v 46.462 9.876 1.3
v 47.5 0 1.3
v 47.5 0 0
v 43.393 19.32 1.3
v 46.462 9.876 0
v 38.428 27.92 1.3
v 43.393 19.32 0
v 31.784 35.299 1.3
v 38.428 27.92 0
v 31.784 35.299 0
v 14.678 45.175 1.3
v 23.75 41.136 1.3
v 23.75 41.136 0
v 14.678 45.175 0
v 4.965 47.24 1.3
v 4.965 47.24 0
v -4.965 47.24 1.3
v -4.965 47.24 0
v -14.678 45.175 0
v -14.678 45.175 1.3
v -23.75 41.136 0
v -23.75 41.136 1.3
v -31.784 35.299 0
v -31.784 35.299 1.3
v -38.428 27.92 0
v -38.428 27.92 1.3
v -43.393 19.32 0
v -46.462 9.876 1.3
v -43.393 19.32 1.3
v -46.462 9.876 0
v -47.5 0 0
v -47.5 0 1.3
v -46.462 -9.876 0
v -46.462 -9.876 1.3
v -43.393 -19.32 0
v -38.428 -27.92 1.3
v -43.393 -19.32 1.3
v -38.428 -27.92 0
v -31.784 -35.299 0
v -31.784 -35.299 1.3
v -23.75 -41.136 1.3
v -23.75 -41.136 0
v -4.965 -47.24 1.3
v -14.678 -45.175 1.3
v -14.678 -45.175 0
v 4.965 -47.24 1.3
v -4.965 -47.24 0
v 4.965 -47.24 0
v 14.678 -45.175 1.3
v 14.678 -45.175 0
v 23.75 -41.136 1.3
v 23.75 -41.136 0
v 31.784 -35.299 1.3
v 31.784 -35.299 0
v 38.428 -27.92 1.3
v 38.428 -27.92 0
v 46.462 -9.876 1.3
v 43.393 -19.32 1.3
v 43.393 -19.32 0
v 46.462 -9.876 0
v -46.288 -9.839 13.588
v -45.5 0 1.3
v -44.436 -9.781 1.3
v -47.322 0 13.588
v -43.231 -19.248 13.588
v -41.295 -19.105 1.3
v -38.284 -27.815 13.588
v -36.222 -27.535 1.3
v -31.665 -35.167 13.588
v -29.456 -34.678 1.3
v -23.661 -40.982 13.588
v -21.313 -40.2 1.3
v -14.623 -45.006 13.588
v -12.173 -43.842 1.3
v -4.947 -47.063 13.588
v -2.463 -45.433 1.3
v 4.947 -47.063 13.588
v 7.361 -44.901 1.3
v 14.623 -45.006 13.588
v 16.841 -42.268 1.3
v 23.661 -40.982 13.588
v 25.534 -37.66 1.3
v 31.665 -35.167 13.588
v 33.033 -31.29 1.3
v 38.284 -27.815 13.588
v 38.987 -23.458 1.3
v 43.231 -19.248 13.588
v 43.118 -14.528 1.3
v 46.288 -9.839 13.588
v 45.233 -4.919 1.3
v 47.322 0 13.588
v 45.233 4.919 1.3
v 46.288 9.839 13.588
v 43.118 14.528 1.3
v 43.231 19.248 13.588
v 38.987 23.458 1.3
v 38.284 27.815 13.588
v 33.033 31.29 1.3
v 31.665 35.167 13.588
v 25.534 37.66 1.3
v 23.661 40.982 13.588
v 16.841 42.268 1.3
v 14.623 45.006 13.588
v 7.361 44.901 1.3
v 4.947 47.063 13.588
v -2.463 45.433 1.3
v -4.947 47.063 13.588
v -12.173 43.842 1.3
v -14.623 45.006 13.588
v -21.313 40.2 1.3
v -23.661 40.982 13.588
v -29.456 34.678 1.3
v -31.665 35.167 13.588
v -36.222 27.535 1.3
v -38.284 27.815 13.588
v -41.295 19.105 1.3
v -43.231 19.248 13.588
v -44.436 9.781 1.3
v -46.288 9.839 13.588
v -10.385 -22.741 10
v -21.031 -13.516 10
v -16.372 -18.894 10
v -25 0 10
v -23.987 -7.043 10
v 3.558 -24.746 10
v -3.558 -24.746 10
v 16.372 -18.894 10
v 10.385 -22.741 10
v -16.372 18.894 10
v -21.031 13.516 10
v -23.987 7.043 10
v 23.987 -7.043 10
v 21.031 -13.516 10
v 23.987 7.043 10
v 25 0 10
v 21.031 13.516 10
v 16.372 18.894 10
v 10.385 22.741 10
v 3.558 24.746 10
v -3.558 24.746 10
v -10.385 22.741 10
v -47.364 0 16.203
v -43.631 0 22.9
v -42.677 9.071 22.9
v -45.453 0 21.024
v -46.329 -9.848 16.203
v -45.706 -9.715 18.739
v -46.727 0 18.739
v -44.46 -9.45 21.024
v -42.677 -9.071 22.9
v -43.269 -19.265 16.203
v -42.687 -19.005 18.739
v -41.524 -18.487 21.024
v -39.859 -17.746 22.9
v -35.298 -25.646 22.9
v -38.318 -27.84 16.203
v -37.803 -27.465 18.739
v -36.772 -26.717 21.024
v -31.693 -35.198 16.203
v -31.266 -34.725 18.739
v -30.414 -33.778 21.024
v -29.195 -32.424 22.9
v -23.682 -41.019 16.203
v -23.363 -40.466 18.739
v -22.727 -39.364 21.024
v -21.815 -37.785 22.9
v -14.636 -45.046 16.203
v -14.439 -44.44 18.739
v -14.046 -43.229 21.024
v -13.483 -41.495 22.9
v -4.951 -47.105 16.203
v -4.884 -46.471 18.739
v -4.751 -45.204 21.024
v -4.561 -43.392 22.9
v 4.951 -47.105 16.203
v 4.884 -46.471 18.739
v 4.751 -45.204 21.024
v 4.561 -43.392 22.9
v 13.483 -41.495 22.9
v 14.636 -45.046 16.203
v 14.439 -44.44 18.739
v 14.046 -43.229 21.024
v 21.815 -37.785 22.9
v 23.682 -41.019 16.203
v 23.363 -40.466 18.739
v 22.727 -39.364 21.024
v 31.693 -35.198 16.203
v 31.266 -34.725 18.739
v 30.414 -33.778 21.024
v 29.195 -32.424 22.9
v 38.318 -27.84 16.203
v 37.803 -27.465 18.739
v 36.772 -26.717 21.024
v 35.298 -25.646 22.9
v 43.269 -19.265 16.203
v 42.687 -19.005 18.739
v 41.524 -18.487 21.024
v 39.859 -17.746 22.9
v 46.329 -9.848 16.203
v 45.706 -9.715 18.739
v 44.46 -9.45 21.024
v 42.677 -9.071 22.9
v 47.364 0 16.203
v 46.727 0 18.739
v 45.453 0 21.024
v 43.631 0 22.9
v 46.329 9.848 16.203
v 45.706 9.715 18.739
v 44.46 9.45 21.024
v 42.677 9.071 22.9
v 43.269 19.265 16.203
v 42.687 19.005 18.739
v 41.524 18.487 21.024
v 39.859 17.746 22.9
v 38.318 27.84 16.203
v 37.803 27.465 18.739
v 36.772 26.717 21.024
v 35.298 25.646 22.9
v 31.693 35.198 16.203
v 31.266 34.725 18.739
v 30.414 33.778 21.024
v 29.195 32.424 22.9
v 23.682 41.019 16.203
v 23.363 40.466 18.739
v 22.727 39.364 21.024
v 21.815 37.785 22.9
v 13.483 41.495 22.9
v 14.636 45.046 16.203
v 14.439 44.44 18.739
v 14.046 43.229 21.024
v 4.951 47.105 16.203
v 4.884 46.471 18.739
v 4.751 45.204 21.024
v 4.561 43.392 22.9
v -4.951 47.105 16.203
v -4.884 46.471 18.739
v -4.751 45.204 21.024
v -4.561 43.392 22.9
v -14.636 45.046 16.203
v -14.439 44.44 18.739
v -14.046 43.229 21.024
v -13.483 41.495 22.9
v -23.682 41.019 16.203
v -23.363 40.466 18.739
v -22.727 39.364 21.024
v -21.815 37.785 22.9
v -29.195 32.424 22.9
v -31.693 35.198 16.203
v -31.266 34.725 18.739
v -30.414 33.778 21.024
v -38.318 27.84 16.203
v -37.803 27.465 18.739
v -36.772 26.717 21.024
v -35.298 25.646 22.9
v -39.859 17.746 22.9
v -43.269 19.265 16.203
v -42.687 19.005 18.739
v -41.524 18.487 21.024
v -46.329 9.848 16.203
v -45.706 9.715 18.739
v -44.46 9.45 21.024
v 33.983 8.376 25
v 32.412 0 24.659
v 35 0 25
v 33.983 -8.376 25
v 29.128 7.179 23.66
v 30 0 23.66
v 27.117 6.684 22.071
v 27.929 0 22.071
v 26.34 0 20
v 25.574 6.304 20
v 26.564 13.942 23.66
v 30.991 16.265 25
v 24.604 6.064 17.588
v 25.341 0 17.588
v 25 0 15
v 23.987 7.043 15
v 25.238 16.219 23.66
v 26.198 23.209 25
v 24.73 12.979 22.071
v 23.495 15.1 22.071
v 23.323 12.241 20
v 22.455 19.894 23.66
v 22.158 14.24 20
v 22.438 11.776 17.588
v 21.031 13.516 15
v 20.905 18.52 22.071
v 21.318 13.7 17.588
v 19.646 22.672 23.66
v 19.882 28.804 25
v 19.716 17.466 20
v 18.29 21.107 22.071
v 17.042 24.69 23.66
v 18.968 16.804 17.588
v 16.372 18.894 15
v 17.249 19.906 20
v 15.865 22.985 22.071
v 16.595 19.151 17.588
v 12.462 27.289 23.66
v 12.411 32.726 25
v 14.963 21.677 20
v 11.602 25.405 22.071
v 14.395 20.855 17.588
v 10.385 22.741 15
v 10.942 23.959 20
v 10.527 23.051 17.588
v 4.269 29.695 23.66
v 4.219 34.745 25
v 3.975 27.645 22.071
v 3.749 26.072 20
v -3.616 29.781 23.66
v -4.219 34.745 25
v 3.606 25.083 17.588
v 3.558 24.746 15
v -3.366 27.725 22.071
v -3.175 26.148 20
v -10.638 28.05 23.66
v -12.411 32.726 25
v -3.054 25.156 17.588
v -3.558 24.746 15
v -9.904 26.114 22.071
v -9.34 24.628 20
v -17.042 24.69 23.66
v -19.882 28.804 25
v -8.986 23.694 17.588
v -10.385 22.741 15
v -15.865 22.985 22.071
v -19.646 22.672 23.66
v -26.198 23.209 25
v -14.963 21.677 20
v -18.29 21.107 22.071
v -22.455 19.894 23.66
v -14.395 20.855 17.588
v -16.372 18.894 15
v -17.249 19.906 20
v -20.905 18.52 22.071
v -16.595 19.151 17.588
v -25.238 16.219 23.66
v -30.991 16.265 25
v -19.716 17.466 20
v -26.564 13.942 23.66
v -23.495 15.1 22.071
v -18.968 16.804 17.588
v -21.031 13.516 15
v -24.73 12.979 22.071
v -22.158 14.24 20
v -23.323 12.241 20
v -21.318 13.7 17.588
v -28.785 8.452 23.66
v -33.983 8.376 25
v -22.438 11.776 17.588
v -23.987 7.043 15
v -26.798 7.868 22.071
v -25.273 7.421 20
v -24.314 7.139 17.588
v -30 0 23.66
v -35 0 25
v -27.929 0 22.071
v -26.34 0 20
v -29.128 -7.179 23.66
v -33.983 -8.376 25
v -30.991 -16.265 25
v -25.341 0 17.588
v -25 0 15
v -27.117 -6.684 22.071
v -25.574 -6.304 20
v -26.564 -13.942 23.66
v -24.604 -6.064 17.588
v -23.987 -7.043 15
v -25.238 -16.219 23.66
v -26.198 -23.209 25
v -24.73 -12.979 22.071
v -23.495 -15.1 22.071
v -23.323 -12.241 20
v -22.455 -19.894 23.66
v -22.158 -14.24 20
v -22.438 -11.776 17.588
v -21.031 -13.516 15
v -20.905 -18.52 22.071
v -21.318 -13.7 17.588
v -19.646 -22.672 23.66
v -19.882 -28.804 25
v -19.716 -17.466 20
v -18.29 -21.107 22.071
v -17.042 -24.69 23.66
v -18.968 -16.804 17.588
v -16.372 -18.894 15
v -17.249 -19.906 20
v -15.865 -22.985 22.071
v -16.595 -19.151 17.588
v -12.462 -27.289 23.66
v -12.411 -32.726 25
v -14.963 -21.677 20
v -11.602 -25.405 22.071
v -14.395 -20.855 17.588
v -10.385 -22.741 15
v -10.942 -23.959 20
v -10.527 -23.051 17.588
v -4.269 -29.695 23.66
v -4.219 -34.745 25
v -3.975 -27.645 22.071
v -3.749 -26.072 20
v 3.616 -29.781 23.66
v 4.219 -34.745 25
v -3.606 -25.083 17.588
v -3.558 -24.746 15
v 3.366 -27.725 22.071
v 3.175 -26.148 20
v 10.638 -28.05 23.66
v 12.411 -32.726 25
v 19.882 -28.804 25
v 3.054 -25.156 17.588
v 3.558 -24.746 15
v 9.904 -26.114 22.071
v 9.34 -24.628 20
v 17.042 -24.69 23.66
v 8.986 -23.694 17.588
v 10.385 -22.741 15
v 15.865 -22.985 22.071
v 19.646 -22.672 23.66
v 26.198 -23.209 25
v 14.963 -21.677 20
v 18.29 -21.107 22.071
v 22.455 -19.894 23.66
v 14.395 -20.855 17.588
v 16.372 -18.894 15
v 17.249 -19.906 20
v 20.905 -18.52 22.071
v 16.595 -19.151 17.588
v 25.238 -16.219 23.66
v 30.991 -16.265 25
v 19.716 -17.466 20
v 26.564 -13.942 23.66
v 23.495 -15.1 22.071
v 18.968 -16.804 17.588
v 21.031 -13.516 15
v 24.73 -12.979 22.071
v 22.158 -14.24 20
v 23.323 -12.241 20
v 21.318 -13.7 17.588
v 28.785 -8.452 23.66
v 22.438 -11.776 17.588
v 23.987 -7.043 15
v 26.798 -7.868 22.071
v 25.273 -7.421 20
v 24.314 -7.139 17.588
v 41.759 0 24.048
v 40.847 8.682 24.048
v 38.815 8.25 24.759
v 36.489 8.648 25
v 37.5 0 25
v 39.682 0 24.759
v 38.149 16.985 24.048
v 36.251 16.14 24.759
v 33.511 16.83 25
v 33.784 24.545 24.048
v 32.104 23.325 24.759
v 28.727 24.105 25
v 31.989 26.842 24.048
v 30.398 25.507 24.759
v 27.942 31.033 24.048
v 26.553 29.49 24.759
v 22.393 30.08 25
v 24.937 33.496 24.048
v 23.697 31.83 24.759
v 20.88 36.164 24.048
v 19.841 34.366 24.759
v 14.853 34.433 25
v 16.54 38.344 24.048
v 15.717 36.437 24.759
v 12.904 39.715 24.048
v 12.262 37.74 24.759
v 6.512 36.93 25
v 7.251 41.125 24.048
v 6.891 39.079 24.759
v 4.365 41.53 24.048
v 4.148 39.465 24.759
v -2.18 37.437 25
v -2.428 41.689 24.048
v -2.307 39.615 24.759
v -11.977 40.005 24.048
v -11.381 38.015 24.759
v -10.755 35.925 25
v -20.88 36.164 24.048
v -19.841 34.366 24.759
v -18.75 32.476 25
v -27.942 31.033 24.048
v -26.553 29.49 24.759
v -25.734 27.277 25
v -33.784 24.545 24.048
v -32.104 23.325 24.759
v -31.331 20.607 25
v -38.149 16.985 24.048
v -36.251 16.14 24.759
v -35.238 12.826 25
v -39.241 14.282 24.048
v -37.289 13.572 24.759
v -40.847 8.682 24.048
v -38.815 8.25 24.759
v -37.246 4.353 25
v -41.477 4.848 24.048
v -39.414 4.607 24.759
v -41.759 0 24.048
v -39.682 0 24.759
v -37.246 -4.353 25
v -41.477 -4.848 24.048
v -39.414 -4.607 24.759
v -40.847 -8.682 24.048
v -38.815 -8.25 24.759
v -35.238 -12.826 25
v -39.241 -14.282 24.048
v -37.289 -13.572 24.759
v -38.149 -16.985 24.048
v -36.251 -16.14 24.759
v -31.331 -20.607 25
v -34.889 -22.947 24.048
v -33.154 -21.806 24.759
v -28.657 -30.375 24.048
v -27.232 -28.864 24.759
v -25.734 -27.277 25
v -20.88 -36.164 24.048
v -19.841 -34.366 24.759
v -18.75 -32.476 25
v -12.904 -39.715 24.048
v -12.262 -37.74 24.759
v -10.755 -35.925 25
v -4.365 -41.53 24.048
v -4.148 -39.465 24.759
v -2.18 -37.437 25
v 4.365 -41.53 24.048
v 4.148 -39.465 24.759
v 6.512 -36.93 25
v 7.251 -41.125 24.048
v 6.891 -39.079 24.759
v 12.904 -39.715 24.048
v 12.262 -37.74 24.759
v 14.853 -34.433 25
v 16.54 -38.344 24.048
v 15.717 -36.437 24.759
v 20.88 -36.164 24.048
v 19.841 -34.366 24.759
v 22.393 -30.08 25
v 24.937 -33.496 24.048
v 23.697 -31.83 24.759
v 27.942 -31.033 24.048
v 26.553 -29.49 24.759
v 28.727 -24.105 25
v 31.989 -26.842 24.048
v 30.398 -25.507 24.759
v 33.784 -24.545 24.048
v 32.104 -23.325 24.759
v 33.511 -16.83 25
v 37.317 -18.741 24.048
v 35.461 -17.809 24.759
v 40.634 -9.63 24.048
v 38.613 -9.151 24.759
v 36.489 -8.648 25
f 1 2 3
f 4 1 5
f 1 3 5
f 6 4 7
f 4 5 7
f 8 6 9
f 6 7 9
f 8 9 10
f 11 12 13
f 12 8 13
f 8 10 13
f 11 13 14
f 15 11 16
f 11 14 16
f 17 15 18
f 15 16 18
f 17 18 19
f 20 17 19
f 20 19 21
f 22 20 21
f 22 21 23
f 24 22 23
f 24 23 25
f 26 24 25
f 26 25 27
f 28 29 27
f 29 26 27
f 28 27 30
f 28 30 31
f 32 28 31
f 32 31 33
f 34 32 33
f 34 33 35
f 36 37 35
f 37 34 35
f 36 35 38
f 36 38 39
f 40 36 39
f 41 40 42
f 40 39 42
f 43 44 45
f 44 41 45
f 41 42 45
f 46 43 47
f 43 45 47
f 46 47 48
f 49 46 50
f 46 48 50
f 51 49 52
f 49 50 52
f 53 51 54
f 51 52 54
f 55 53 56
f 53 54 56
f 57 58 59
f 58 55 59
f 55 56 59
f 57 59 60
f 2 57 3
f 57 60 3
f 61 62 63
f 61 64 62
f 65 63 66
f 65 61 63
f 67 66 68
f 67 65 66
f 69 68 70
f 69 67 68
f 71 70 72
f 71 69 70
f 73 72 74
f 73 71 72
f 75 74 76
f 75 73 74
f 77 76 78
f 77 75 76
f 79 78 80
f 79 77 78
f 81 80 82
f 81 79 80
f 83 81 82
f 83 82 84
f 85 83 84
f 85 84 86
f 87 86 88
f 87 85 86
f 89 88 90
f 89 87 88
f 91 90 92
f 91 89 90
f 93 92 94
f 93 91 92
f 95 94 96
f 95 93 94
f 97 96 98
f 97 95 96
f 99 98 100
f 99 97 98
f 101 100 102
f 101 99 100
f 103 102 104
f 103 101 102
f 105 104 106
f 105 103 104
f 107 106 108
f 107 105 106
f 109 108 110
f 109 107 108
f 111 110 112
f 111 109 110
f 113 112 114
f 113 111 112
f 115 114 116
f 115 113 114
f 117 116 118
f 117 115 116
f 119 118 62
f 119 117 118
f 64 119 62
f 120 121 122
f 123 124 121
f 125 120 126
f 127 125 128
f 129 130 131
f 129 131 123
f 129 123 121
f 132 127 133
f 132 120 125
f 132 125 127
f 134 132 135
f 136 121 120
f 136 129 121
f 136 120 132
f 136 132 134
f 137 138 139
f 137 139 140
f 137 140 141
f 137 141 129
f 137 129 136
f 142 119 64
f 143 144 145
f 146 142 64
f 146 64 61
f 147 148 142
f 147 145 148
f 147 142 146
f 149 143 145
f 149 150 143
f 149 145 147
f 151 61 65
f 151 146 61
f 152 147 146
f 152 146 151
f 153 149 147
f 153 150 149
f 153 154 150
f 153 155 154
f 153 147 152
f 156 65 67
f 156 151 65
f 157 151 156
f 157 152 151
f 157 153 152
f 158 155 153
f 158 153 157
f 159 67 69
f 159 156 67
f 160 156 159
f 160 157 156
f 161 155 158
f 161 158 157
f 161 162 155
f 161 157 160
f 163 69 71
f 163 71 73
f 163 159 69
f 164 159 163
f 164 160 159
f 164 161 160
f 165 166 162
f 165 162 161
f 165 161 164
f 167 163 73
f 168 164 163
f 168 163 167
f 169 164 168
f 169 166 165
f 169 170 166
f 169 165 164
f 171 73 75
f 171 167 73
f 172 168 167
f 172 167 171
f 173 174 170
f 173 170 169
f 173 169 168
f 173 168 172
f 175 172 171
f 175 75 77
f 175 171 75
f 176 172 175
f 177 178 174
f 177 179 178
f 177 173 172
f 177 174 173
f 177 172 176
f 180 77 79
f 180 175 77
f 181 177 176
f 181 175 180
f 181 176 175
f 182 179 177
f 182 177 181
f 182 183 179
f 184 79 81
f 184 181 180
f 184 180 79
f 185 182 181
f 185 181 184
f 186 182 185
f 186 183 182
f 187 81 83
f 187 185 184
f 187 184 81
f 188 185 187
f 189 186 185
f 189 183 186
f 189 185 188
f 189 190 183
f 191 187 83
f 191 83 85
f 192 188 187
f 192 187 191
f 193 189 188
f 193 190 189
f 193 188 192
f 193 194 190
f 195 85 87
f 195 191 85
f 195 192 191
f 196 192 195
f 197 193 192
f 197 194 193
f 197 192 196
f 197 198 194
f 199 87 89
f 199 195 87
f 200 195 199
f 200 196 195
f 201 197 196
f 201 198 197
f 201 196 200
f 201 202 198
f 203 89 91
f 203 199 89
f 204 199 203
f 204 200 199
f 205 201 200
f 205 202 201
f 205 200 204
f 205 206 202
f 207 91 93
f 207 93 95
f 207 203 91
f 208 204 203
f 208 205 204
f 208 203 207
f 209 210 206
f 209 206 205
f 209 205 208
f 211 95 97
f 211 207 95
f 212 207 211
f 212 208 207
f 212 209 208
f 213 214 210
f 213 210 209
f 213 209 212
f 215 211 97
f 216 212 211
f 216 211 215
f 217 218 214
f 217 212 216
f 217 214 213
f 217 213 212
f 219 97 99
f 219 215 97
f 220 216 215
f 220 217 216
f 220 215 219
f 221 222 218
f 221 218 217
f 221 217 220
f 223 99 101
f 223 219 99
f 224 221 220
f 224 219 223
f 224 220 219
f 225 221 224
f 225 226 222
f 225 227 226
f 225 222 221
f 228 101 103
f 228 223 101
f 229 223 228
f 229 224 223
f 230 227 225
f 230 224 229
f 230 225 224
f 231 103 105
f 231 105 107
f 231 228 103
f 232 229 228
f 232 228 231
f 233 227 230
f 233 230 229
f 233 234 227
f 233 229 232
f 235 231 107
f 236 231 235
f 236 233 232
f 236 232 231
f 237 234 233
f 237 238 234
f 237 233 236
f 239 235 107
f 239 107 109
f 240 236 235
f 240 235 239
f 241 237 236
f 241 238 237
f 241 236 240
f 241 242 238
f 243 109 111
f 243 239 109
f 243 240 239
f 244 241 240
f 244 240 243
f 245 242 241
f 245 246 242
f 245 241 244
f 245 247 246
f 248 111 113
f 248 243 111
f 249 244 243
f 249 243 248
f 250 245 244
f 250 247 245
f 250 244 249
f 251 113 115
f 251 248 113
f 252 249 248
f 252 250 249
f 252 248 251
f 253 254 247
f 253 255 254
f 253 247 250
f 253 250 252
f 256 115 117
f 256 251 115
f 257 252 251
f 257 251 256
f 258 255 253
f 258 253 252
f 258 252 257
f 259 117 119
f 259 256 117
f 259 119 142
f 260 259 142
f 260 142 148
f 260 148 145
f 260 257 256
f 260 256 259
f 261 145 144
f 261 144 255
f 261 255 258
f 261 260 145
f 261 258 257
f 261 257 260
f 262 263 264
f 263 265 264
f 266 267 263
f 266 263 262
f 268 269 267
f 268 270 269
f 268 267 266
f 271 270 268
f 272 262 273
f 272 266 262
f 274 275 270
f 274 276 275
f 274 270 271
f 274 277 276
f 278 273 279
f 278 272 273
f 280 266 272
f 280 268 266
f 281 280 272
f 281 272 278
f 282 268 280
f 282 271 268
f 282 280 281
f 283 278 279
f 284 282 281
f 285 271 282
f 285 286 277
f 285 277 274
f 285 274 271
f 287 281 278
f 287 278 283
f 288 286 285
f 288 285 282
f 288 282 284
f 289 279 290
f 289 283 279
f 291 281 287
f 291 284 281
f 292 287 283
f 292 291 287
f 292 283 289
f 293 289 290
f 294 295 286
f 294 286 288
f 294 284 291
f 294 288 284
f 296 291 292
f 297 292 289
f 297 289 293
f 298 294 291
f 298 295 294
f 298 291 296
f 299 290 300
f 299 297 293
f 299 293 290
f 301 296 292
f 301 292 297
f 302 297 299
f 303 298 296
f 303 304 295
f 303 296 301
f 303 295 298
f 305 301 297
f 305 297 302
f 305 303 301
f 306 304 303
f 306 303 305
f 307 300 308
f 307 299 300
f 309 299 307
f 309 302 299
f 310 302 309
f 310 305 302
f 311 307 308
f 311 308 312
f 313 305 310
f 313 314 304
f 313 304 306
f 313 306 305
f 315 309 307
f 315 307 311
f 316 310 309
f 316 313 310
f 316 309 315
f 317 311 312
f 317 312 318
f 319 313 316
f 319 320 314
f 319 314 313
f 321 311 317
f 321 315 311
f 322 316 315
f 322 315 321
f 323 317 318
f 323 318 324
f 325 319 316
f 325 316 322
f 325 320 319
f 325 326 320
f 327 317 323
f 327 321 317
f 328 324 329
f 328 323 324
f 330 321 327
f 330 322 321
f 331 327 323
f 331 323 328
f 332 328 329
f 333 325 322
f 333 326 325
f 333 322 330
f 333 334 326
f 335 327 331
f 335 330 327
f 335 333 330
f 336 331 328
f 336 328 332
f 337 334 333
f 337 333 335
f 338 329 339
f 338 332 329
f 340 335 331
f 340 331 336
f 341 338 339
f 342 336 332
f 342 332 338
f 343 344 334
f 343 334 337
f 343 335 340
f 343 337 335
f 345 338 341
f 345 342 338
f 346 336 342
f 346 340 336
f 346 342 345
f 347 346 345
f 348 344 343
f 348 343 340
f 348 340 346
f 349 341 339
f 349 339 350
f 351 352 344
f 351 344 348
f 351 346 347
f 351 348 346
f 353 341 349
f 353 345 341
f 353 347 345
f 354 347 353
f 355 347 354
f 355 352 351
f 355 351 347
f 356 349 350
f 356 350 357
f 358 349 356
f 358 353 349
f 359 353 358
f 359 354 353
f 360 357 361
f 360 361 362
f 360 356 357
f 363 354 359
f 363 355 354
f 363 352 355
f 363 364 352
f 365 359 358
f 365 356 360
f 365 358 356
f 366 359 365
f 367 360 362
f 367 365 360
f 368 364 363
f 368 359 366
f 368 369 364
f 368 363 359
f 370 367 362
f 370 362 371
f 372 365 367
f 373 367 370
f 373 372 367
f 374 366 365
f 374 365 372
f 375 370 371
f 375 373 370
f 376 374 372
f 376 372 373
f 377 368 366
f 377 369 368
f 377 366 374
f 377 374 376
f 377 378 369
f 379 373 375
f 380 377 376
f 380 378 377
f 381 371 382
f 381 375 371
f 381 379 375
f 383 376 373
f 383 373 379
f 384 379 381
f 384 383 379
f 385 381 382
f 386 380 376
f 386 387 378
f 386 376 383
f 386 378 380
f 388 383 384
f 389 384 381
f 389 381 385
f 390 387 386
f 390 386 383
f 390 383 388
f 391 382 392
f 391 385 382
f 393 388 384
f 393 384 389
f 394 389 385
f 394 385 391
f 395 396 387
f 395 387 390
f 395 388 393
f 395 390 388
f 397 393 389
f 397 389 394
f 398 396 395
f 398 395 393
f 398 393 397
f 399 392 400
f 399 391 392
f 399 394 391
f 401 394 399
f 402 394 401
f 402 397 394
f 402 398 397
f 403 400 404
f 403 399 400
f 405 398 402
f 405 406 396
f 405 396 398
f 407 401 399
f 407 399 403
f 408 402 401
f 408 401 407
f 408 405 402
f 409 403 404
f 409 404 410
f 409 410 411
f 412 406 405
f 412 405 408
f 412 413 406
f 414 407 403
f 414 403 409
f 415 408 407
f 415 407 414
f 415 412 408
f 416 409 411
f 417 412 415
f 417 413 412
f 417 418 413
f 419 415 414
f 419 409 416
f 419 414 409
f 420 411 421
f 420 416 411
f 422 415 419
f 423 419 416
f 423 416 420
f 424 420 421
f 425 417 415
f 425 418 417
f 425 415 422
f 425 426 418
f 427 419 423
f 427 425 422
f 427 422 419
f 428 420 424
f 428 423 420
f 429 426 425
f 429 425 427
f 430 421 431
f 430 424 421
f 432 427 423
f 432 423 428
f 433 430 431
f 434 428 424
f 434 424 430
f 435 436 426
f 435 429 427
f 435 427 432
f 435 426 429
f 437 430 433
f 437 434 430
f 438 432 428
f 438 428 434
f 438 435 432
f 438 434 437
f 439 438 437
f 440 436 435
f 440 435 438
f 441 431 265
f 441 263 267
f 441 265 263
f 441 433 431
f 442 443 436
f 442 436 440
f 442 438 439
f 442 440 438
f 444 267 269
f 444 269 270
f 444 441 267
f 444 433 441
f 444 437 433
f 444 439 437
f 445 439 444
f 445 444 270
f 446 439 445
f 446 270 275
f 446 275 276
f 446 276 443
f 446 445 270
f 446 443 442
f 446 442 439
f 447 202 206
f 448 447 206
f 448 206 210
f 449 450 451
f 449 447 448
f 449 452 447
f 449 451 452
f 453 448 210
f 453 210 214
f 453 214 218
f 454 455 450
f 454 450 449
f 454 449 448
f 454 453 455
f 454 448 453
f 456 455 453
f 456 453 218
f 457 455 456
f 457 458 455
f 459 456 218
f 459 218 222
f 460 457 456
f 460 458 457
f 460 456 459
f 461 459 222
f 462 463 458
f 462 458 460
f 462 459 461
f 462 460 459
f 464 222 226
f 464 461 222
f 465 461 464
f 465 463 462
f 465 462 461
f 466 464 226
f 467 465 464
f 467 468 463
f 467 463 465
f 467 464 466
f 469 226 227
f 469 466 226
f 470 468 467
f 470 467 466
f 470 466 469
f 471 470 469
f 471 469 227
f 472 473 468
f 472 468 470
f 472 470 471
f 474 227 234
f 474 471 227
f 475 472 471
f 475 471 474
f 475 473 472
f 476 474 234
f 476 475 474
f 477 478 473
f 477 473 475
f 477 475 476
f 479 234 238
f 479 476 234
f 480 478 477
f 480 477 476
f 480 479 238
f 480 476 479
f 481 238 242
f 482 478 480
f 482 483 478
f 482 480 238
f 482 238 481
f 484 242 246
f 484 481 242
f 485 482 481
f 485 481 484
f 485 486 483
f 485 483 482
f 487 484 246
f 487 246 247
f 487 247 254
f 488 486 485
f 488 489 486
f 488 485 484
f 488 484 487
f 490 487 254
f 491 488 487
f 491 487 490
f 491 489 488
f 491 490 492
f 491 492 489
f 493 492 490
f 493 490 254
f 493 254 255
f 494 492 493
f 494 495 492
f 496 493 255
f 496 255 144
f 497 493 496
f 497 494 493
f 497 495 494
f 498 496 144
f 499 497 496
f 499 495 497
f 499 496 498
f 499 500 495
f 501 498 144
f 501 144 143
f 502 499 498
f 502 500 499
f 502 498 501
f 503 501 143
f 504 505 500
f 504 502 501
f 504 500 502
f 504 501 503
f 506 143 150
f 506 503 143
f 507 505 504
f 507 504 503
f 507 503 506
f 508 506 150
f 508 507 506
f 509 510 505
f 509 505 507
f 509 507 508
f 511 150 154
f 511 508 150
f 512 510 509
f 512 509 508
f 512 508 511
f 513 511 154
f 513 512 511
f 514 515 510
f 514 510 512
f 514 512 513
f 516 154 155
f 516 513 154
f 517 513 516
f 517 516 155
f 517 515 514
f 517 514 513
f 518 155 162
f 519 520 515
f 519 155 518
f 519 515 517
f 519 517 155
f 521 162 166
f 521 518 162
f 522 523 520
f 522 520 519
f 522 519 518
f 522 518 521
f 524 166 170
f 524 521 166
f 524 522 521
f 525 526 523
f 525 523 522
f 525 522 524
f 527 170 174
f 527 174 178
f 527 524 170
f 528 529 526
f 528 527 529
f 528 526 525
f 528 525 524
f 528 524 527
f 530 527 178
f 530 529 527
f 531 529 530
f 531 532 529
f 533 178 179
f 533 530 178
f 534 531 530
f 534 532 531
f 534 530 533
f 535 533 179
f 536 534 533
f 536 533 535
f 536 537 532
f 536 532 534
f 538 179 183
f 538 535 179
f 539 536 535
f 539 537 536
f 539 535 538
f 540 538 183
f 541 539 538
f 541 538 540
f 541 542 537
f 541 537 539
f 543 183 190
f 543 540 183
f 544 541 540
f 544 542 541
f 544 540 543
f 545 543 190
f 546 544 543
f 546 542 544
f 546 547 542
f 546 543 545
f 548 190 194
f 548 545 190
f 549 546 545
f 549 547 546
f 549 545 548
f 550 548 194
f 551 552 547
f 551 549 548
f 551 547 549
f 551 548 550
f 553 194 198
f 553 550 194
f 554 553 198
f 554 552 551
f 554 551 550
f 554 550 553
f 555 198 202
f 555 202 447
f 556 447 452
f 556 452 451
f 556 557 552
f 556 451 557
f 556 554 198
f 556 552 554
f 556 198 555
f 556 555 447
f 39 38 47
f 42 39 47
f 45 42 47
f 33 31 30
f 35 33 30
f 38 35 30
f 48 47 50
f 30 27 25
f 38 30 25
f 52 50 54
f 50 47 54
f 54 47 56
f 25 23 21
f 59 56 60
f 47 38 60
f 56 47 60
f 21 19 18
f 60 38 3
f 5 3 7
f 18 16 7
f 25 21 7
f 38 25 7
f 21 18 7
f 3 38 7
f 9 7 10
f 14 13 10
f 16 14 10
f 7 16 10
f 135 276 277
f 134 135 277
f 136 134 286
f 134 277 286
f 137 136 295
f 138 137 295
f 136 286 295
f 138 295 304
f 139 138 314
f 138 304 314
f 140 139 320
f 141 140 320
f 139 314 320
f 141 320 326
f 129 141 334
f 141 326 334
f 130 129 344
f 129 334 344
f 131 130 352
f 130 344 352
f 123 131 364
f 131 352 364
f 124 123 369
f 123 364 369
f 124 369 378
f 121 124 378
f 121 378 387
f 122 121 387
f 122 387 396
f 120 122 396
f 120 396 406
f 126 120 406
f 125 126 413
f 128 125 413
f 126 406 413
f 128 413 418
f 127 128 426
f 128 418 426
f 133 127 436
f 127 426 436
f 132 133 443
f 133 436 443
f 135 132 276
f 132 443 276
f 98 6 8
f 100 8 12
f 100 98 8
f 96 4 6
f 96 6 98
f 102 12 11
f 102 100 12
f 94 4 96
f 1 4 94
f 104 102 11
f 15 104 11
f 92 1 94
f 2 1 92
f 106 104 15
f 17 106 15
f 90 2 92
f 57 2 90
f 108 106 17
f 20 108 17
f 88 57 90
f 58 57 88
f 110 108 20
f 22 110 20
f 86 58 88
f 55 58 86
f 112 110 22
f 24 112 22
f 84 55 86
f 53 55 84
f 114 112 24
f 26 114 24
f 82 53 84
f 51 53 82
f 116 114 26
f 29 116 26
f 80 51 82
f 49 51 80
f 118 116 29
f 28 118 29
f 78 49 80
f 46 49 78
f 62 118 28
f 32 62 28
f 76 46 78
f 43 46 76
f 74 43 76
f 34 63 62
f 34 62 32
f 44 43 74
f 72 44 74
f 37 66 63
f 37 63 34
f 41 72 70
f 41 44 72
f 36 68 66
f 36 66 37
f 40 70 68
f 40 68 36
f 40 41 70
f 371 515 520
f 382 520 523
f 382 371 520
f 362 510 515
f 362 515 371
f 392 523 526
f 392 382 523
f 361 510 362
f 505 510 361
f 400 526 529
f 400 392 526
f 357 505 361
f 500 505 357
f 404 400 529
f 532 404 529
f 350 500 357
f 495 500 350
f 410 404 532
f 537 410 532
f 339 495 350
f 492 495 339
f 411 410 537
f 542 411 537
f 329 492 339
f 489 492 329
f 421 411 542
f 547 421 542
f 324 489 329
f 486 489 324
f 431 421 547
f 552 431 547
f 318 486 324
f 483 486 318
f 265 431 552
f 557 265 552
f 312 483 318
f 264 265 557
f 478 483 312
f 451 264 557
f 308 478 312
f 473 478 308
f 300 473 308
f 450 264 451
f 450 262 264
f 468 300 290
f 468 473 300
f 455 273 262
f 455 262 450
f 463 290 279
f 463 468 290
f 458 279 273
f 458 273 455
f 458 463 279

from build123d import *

# Parameters (mm, degrees)
F0_R     = 47.5
F1_DEPTH = 25
F2_R     = 25
F3_DEPTH = 15
F4_R     = 10


with BuildPart() as f1:
    # F0 (on Top) → F1 (new body)
    with BuildSketch(Plane.XY):
        Circle(F0_R)
    extrude(amount=F1_DEPTH)

    # F2 (on face) → F3 (cut)
    with BuildSketch(Plane.XY.offset(25)):
        Circle(F2_R)
    extrude(amount=-F3_DEPTH, mode=Mode.SUBTRACT)

    # F4
    f4_edges = [f1.edges().sort_by_distance(p)[0] for p in [
        (-47.5, 0, 25),
        (-25, 0, 25),
    ]]
    fillet(f4_edges, radius=F4_R)

    # F5 (on Front) → F6 (revolve, cut)
    with BuildSketch(Plane.XZ):
        with BuildLine():
            Line((-50.882176, -0.324849), (-47.5, 0))
            Line((-47.5, 0), (-47.5, 1.3))
            Line((-47.5, 1.3), (-45.5, 1.3))
            Line((-45.5, 1.3), (-47.322187, 13.587635))
            ThreePointArc((-47.322187, 13.587635), (-44.992555, 21.59772), (-37.400495, 25.054492))
            Line((-37.400495, 25.054492), (-37.400495, 26.943451))
            Line((-37.400495, 26.943451), (-49.502667, 21.701315))
            Line((-49.502667, 21.701315), (-50.882176, -0.324849))
        make_face()
    revolve(axis=Axis((0, 0, 17.452553), (0, 0, 1)), mode=Mode.SUBTRACT)


solid = f1.part
